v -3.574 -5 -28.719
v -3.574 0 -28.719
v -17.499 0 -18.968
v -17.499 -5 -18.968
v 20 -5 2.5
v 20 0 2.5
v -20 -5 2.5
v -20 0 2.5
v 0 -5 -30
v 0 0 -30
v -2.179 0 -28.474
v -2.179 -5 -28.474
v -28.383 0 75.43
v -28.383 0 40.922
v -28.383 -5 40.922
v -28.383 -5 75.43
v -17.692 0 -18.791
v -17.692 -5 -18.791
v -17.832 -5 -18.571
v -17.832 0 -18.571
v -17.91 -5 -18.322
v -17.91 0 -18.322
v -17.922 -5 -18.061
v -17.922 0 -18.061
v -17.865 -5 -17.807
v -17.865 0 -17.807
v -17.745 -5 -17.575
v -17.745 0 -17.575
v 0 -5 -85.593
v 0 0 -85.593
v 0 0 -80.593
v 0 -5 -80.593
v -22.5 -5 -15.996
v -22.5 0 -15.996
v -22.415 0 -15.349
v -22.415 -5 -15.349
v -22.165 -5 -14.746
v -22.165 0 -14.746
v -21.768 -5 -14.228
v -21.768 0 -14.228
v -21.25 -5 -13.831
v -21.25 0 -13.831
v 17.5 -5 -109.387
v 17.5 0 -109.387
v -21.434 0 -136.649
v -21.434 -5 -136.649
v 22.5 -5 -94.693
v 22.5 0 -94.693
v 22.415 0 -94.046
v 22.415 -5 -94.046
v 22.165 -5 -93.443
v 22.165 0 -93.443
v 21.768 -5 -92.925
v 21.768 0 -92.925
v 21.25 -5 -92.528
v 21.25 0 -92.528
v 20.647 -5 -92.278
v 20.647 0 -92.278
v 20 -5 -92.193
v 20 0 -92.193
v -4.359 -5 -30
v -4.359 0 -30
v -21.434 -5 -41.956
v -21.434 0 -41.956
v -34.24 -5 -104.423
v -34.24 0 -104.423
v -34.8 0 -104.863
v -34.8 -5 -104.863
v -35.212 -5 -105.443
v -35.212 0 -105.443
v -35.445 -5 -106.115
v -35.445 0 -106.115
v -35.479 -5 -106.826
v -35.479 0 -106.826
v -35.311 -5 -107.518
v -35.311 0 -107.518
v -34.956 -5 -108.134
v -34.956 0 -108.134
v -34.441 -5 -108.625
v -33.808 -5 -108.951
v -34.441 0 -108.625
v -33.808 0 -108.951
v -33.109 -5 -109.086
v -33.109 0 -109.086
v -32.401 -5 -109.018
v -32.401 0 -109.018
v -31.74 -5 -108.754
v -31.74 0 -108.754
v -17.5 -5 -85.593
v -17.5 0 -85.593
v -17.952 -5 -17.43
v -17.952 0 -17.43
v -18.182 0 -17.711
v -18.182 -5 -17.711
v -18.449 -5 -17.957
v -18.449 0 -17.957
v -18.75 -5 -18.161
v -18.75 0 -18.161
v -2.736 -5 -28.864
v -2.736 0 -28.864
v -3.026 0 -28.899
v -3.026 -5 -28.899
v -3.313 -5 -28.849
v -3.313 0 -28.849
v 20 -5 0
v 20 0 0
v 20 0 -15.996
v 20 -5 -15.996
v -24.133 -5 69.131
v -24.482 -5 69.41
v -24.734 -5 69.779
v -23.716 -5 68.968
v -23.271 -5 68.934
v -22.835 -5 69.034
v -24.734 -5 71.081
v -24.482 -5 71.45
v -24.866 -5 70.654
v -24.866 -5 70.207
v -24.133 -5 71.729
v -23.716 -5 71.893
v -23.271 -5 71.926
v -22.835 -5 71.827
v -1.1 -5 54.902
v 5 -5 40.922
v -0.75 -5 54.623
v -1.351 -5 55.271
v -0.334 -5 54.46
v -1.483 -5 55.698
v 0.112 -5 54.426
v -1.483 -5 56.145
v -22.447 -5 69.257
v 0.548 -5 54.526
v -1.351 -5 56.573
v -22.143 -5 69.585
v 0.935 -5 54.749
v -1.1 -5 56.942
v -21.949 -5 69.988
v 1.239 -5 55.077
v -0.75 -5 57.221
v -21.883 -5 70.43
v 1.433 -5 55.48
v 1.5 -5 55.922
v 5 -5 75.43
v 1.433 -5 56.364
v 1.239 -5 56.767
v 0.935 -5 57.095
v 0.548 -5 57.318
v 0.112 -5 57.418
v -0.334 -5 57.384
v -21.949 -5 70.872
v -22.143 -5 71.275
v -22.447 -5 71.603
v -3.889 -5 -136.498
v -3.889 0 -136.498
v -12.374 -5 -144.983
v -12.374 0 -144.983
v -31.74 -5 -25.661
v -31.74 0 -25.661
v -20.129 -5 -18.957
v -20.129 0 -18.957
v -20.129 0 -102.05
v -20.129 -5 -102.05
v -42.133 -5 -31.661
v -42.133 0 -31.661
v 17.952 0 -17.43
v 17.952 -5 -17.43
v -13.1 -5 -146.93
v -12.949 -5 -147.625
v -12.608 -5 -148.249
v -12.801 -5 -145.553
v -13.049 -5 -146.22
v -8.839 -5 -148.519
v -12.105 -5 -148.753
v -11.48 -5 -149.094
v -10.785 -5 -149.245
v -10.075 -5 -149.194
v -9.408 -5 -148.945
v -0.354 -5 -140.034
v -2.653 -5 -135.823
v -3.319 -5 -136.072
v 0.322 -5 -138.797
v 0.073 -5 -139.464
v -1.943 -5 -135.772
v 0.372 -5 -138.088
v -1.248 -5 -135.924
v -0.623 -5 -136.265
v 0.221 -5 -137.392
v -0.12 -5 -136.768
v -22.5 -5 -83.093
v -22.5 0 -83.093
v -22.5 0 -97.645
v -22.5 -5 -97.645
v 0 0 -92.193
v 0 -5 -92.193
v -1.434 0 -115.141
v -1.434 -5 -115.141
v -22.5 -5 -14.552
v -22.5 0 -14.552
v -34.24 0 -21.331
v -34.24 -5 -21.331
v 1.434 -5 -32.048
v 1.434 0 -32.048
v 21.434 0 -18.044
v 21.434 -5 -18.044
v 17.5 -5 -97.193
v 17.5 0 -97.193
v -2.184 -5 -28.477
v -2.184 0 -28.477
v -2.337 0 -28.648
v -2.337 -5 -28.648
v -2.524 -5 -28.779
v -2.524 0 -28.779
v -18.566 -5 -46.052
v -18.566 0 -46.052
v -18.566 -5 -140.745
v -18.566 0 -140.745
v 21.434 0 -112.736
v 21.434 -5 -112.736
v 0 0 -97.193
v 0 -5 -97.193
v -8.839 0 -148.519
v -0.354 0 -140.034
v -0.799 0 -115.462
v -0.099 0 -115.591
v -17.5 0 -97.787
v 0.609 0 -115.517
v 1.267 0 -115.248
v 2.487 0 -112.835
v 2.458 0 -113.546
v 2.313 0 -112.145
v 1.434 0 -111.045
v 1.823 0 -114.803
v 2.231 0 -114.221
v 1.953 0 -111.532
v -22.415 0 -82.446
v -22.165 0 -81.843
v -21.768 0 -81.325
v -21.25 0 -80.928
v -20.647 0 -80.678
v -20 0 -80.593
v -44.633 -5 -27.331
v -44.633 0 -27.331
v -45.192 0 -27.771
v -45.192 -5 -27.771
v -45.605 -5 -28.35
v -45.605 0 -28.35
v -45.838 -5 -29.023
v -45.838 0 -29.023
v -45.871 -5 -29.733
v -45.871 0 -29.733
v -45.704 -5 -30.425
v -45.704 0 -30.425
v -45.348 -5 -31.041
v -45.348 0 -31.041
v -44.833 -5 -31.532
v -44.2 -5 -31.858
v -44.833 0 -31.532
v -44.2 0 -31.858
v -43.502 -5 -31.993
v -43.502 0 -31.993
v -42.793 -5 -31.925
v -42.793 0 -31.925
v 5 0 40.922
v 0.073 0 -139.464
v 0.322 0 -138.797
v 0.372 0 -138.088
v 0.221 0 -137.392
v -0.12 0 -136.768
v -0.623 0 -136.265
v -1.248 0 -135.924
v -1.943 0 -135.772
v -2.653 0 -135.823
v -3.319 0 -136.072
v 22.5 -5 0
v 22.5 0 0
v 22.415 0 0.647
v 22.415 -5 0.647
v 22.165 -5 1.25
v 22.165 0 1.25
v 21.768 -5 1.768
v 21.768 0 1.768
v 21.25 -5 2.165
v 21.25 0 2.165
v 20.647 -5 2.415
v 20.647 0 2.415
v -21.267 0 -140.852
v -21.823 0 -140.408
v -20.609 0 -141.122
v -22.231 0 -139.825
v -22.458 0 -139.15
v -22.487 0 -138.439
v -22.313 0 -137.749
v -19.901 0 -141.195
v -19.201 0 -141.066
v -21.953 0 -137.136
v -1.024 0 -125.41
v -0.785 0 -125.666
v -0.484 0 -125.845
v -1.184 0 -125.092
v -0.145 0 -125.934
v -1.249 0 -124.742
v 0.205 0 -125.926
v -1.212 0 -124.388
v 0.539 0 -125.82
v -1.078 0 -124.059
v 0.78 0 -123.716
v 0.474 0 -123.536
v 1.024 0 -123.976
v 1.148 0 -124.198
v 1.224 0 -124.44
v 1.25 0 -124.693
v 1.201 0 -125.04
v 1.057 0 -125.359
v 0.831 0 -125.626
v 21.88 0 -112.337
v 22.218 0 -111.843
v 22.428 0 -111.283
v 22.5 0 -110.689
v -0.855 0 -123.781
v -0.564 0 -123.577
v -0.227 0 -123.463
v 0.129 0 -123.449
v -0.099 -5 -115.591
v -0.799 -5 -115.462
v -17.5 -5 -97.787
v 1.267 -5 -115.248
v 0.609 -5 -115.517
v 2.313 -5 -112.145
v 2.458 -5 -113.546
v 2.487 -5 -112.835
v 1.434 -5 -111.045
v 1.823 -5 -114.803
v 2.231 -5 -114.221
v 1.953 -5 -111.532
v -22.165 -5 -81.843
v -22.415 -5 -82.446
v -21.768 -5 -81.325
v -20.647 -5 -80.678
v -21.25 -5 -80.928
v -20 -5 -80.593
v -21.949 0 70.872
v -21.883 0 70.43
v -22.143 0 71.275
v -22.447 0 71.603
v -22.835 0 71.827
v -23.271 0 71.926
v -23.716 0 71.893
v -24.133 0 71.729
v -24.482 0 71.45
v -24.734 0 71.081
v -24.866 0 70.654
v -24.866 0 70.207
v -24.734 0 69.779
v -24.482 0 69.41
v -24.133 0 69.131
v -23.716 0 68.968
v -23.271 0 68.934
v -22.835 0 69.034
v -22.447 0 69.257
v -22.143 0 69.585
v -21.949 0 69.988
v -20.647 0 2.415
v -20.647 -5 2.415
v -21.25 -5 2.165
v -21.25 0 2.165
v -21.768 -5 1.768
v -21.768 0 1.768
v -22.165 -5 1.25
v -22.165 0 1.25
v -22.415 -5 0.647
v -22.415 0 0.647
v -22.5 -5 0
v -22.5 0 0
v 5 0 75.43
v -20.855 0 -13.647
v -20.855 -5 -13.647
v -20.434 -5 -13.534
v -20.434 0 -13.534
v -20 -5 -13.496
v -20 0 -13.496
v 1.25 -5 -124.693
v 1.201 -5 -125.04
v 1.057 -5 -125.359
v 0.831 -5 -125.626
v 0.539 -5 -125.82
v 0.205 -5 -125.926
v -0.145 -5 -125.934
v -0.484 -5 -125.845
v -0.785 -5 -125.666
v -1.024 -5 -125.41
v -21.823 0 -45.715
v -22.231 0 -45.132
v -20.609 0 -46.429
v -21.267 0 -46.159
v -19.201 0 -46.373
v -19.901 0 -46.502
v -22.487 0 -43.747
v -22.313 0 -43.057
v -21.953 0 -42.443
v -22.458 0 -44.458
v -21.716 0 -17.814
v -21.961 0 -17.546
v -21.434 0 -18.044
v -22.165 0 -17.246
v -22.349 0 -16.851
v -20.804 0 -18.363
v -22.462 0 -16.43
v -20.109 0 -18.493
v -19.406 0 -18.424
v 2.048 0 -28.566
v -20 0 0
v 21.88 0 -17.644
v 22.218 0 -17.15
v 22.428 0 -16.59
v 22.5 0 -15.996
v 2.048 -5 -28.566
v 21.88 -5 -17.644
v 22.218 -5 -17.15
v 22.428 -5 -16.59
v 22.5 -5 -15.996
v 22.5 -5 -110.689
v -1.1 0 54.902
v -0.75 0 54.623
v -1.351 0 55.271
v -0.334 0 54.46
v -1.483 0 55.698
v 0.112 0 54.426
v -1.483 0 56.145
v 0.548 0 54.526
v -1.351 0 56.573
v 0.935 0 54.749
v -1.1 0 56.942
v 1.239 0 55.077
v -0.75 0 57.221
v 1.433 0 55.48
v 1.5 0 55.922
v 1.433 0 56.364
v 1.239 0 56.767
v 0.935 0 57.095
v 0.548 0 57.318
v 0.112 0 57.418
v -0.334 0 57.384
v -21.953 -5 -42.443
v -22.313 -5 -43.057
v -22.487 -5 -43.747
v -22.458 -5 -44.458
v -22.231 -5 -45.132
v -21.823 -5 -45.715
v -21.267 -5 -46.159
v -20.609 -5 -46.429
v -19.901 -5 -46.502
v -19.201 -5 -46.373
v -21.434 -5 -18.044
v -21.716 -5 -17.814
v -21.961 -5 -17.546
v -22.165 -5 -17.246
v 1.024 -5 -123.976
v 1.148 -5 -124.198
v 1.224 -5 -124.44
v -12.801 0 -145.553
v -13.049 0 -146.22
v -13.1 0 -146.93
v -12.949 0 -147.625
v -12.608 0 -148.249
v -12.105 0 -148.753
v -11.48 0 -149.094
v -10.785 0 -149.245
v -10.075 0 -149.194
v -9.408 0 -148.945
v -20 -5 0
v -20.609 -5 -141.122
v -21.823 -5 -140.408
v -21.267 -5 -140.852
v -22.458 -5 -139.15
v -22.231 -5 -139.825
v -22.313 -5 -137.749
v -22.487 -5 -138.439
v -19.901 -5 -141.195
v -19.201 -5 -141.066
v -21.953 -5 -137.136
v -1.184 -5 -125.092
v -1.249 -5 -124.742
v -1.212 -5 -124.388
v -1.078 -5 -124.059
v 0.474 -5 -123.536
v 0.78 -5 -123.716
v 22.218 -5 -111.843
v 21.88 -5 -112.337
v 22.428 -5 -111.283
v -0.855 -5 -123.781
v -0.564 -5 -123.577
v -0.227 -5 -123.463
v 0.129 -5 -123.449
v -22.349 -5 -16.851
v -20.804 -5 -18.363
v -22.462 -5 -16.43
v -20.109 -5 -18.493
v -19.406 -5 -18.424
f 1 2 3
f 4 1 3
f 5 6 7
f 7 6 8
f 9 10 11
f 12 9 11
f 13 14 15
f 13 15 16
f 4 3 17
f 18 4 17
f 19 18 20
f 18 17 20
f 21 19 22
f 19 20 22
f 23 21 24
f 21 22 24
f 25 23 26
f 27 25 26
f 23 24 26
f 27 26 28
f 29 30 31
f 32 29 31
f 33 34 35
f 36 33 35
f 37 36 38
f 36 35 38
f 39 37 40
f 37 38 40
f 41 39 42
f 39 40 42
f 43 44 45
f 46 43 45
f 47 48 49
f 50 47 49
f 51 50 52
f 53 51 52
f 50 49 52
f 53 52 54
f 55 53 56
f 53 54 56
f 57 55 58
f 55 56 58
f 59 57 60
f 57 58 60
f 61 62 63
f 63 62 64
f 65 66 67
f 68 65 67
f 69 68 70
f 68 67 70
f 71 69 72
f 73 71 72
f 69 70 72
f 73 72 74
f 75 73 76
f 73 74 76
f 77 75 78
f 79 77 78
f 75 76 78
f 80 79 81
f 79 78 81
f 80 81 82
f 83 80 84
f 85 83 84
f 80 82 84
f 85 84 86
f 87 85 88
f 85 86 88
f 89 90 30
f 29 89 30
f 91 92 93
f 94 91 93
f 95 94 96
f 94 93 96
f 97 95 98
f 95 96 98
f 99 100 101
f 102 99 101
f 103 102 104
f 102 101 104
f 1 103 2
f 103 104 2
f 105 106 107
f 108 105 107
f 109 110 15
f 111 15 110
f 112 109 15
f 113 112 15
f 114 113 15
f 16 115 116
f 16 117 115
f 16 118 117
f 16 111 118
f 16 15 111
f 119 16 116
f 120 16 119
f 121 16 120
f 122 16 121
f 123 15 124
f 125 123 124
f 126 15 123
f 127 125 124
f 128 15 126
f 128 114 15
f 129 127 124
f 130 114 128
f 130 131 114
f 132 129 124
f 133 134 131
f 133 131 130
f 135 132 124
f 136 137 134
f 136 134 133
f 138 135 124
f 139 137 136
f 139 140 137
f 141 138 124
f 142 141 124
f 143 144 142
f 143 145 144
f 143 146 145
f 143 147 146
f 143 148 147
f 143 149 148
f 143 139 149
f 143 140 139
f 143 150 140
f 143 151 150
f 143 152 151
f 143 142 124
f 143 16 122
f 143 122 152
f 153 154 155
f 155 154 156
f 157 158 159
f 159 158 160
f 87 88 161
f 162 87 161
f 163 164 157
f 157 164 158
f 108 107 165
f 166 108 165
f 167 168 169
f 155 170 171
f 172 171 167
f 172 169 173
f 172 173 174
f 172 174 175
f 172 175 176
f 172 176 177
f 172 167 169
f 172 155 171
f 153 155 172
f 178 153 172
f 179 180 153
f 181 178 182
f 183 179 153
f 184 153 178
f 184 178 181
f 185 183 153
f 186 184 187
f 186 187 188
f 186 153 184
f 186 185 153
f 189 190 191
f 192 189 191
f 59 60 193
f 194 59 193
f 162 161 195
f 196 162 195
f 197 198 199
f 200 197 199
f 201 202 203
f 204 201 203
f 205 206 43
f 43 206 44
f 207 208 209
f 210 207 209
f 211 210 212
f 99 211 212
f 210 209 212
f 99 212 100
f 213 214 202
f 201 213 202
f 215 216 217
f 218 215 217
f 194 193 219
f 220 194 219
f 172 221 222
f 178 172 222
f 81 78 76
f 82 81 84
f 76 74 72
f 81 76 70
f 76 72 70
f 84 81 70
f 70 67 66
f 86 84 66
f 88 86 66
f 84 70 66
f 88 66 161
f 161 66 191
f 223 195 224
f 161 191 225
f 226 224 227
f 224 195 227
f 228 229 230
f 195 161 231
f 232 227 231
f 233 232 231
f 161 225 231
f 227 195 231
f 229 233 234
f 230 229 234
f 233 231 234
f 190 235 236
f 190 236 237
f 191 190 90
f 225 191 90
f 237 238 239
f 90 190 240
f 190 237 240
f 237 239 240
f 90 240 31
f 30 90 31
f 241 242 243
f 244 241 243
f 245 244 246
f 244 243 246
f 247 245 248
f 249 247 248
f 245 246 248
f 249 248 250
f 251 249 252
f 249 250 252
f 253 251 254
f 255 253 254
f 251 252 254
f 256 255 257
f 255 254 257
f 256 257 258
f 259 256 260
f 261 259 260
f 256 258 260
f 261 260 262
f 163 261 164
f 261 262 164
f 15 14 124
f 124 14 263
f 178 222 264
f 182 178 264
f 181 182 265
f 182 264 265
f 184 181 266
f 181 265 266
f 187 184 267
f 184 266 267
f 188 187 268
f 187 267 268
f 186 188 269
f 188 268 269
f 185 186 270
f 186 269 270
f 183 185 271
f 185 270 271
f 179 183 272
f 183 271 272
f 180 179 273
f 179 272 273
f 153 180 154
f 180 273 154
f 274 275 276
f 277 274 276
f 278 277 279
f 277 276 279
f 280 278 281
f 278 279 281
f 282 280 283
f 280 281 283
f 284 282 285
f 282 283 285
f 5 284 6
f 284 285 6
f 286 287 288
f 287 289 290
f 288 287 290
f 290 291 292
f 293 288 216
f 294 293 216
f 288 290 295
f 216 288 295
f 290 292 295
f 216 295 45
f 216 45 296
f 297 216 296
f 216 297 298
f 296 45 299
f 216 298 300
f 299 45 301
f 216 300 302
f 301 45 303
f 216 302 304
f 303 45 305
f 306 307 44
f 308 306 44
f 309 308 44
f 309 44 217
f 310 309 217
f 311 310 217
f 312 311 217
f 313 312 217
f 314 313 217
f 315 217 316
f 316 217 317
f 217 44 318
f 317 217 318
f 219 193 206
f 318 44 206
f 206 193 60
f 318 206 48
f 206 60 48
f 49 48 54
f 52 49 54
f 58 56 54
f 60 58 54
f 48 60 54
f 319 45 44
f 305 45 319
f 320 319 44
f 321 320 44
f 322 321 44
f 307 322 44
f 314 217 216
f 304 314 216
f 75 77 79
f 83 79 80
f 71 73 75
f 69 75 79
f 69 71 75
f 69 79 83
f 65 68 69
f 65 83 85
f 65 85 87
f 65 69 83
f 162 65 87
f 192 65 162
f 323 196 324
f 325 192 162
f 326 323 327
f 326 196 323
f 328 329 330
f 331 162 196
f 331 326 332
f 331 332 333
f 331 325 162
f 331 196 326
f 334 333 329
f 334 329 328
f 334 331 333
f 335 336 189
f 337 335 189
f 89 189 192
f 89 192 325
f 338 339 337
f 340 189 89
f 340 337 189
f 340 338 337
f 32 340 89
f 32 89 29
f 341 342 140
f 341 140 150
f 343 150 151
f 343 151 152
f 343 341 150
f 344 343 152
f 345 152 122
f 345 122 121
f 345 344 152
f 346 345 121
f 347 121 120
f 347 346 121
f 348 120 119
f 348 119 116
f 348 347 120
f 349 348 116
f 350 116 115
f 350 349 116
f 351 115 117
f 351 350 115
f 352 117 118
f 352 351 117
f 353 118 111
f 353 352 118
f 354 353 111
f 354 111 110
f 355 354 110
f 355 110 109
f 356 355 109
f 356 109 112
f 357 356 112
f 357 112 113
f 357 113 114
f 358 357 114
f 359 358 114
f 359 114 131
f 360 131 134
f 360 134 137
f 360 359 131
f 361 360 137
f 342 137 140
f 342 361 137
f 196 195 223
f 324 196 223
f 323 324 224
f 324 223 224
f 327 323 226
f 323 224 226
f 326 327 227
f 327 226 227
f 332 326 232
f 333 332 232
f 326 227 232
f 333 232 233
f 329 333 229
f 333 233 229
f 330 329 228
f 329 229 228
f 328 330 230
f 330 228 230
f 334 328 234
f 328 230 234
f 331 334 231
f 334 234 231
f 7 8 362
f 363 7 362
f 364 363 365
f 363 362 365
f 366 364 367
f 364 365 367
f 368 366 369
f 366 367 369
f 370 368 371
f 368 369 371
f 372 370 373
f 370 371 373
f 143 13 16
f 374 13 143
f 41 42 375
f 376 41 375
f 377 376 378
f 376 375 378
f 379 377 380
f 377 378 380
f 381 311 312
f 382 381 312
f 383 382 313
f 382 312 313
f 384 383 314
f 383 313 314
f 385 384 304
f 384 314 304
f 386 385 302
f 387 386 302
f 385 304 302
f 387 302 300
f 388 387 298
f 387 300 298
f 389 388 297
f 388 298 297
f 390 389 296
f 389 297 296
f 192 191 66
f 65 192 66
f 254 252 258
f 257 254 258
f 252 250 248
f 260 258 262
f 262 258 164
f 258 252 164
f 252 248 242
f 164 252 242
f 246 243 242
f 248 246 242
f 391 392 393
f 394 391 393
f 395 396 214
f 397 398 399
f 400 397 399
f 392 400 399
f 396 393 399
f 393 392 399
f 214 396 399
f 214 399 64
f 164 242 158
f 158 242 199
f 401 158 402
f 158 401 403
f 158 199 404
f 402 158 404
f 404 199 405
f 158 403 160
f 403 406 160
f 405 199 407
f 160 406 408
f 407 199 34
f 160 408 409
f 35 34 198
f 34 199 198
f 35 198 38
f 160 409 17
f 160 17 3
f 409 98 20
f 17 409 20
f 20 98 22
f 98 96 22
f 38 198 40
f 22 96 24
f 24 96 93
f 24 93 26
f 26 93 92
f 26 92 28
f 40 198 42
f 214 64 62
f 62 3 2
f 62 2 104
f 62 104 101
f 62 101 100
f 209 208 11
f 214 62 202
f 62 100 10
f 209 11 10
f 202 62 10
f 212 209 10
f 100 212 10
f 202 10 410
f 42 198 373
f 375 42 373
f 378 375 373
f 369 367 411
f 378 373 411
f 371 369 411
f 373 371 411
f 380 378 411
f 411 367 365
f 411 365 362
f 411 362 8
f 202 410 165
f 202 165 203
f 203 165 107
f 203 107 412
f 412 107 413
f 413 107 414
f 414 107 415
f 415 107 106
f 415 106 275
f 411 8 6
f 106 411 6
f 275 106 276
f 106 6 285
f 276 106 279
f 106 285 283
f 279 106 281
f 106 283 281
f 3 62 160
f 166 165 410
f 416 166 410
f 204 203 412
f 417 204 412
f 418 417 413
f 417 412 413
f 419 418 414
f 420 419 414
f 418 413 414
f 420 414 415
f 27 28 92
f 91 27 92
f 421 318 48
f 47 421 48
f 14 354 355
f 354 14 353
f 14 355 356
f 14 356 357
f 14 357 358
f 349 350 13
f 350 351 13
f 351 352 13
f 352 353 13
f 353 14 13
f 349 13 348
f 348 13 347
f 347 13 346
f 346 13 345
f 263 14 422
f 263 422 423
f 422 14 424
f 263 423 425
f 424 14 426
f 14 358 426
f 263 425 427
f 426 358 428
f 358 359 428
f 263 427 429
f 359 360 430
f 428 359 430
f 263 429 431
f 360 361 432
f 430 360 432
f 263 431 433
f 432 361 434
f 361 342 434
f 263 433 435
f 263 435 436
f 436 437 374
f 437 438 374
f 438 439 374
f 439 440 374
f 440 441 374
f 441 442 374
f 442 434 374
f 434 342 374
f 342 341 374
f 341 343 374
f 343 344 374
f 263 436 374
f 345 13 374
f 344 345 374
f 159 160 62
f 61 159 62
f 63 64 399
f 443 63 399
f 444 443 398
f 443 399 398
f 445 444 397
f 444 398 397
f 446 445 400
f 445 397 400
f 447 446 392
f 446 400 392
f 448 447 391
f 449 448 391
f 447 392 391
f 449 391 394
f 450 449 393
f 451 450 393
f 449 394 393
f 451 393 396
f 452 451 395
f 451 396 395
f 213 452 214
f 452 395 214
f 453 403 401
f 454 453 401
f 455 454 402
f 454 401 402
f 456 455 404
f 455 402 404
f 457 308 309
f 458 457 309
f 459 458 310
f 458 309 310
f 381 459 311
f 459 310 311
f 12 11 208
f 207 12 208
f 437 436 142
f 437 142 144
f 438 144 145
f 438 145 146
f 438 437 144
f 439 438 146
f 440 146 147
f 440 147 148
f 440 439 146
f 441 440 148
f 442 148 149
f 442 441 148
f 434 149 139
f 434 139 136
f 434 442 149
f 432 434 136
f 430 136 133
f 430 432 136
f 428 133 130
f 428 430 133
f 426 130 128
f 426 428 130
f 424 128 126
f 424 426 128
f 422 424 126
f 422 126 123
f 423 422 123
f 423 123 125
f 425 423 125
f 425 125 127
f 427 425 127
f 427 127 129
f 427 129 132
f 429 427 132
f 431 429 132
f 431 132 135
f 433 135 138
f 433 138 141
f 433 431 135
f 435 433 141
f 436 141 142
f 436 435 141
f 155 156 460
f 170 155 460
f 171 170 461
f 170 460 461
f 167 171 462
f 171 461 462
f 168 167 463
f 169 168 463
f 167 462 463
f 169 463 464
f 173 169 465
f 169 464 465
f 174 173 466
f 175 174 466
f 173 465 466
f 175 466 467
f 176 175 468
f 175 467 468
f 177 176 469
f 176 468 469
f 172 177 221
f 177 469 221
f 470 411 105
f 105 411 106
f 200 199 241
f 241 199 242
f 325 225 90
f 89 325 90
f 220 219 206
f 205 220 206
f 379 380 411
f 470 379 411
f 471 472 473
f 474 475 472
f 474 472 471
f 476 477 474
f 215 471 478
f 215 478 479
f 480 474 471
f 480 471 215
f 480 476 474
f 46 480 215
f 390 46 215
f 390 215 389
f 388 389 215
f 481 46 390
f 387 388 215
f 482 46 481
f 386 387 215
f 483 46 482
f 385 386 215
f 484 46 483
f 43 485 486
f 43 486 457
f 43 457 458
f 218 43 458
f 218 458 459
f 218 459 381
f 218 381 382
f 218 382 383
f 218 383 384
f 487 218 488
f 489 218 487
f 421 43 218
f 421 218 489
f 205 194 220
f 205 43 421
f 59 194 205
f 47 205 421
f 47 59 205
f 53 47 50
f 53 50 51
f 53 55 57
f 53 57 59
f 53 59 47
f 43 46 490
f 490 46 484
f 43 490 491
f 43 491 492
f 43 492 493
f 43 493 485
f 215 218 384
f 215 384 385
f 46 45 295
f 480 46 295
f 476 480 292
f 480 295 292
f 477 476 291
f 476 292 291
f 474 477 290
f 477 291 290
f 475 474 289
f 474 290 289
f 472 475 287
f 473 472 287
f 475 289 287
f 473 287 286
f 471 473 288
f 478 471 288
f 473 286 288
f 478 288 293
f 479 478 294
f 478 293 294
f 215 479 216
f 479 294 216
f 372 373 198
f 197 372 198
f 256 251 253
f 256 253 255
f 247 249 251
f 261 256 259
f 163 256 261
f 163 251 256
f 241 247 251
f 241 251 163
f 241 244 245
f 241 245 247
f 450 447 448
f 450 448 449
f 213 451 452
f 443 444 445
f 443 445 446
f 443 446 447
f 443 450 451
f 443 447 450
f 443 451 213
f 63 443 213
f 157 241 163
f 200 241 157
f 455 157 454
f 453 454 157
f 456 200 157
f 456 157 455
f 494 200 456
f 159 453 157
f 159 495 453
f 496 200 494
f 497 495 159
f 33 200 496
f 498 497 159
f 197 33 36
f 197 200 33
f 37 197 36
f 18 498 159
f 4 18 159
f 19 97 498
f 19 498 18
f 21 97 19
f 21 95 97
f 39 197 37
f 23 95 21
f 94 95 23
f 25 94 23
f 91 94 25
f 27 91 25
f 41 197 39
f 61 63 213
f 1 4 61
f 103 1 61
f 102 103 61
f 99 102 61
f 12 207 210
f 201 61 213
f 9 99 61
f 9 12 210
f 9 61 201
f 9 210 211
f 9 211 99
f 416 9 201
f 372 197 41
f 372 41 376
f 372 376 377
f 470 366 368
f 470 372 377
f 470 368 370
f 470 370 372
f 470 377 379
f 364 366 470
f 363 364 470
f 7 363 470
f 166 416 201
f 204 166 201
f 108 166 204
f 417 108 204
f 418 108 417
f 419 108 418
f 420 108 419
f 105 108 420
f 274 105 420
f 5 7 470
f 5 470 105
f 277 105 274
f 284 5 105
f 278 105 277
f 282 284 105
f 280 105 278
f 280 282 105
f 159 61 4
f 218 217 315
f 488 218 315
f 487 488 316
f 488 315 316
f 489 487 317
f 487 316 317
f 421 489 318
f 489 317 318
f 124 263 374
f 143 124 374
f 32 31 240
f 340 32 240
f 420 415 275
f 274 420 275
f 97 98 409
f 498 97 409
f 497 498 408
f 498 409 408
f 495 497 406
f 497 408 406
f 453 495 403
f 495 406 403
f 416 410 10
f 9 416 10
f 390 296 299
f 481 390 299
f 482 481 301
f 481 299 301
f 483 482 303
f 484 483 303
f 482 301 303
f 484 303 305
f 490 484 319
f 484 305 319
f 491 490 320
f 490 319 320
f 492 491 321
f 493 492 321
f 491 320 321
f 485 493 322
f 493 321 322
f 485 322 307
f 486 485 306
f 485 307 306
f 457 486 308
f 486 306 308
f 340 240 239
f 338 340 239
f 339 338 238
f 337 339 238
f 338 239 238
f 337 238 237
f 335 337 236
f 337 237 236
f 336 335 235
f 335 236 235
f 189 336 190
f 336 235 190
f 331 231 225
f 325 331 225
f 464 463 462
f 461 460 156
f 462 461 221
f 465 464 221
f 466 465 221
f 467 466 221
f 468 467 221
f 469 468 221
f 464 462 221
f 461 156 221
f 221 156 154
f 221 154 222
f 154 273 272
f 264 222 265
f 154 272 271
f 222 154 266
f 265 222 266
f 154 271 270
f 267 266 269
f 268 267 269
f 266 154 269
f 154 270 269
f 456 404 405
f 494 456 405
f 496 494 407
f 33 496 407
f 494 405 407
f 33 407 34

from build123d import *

# Parameters (mm, degrees)
F1_DEPTH = 5
F0_W     = 2.5
F0_H     = 2.5
F0_W_2   = 17.5
F0_W_3   = 33.3826859022
F0_H_2   = 34.5083015284
F0_R     = 1.5


with BuildPart() as f1:
    # F0 (on Front) → F1 (new body)
    with BuildSketch(Plane.XZ):
        with BuildLine():
            Line((0, 2.5), (0, 0))
            Line((0, 0), (17.5, 0))
            ThreePointArc((17.5, 0), (18.232233047, 1.767766953), (20, 2.5))
            Line((20, 2.5), (0, 2.5))
        make_face()
        with BuildLine():
            Line((-17.5, 0), (0, 0))
            Line((0, 0), (0, 2.5))
            Line((0, 2.5), (-20, 2.5))
            ThreePointArc((-20, 2.5), (-18.232233047, 1.767766953), (-17.5, 0))
        make_face()
        with BuildLine():
            ThreePointArc((20, 2.5), (18.232233047, 1.767766953), (17.5, 0))
            Line((17.5, 0), (20, 0))
            Line((20, 0), (20, -2.5))
            ThreePointArc((20, -2.5), (21.767766953, -1.767766953), (22.5, 0))
            ThreePointArc((22.5, 0), (21.767766953, 1.767766953), (20, 2.5))
        make_face()
        with BuildLine():
            Line((-20, 0), (-17.5, 0))
            ThreePointArc((-17.5, 0), (-18.232233047, 1.767766953), (-20, 2.5))
            ThreePointArc((-20, 2.5), (-21.767766953, 1.767766953), (-22.5, 0))
            ThreePointArc((-22.5, 0), (-21.767766953, -1.767766953), (-20, -2.5))
            Line((-20, -2.5), (-20, 0))
        make_face()
        with BuildLine():
            ThreePointArc((22.5, 0), (21.767766953, -1.767766953), (20, -2.5))
            Line((20, -2.5), (20, -13.4958492358))
            ThreePointArc((20, -13.4958492358), (21.767766953, -14.2280822828), (22.5, -15.9958492358))
            Line((22.5, -15.9958492358), (22.5, 0))
        make_face()
        with BuildLine():
            Line((-20, -13.4958492358), (-20, -2.5))
            ThreePointArc((-20, -2.5), (-21.767766953, -1.767766953), (-22.5, 0))
            Line((-22.5, 0), (-22.5, -14.5524735628))
            Line((-22.5, -14.5524735628), (-21.25, -13.8307857263))
            ThreePointArc((-21.25, -13.8307857263), (-20.6470476128, -13.5810346701), (-20, -13.4958492358))
        make_face()
        with BuildLine():
            ThreePointArc((22.5, -15.9958492358), (21.767766953, -14.2280822828), (20, -13.4958492358))
            Line((20, -13.4958492358), (20, -15.9958492358))
            Line((20, -15.9958492358), (17.9521198893, -17.4297903267))
            ThreePointArc((17.9521198893, -17.4297903267), (19.5658795558, -18.4578686183), (21.4339410909, -18.0437293465))
            ThreePointArc((21.4339410909, -18.0437293465), (22.2175270829, -17.1502207689), (22.5, -15.9958492358))
        make_face()
        with BuildLine():
            Line((-21.25, -13.8307857263), (-22.5, -14.5524735628))
            Line((-22.5, -14.5524735628), (-22.5, -15.9958492358))
            ThreePointArc((-22.5, -15.9958492358), (-22.1650635095, -14.7458492358), (-21.25, -13.8307857263))
        make_face()
        with BuildLine():
            Line((-22.5, -15.9958492358), (-22.5, -14.5524735628))
            Line((-22.5, -14.5524735628), (-34.2403810568, -21.3307857263))
            ThreePointArc((-34.2403810568, -21.3307857263), (-32.343333444, -21.0810346701), (-30.8253175473, -22.2458492358))
            Line((-30.8253175473, -22.2458492358), (-22.1650635095, -17.2458492358))
            ThreePointArc((-22.1650635095, -17.2458492358), (-22.4148145657, -16.6428968486), (-22.5, -15.9958492358))
        make_face()
        with BuildLine():
            Line((1.4339411547, -32.0478800661), (21.4339410909, -18.0437293465))
            ThreePointArc((21.4339410909, -18.0437293465), (19.5658795558, -18.4578686183), (17.9521198893, -17.4297903267))
            Line((17.9521198893, -17.4297903267), (2.0478801107, -28.5660589091))
            ThreePointArc((2.0478801107, -28.5660589091), (2.4620193893, -30.4341204058), (1.4339411547, -32.0478800661))
        make_face()
        with BuildLine():
            Line((0, -30), (-2.1793084945, -28.474031764))
            Line((-2.1793084945, -28.474031764), (-2.1838419664, -28.4772061352))
            ThreePointArc((-2.1838419664, -28.4772061352), (-2.4264235636, -28.7185294297), (-2.7361610753, -28.8639441388))
            Line((-2.7361610753, -28.8639441388), (-4.3586169891, -30))
            Line((-4.3586169891, -30), (-2.1793084945, -31.525968236))
            Line((-2.1793084945, -31.525968236), (0, -30))
        make_face()
        with BuildLine():
            ThreePointArc((-30.8253175473, -22.2458492358), (-32.343333444, -21.0810346701), (-34.2403810568, -21.3307857263))
            ThreePointArc((-34.2403810568, -21.3307857263), (-35.4051956225, -22.848801623), (-35.1554445662, -24.7458492358))
            Line((-35.1554445662, -24.7458492358), (-32.9903810568, -23.4958492358))
            Line((-32.9903810568, -23.4958492358), (-30.8253175473, -22.2458492358))
        make_face()
        with BuildLine():
            ThreePointArc((-35.1554445662, -24.7458492358), (-35.4051956225, -22.848801623), (-34.2403810568, -21.3307857263))
            Line((-34.2403810568, -21.3307857263), (-44.6326859022, -27.3307857263))
            ThreePointArc((-44.6326859022, -27.3307857263), (-45.5477494116, -30.7458492358), (-42.1326859022, -31.6609127453))
            Line((-42.1326859022, -31.6609127453), (-31.7403810568, -25.6609127453))
            ThreePointArc((-31.7403810568, -25.6609127453), (-33.6374286695, -25.9106638015), (-35.1554445662, -24.7458492358))
        make_face()
        with BuildLine():
            Line((-17.7447367972, -17.5750015311), (-17.9521198893, -17.4297903267))
            ThreePointArc((-17.9521198893, -17.4297903267), (-18.311024481, -17.8390425778), (-18.75, -18.1609127453))
            Line((-18.75, -18.1609127453), (-20.1292975746, -18.9572505713))
            Line((-20.1292975746, -18.9572505713), (-4.3586169891, -30))
            Line((-4.3586169891, -30), (-2.7361610753, -28.8639441388))
            ThreePointArc((-2.7361610753, -28.8639441388), (-3.1710867936, -28.8846333466), (-3.5735764364, -28.7185294297))
            Line((-3.5735764364, -28.7185294297), (-17.4991611893, -18.9677300117))
            ThreePointArc((-17.4991611893, -18.9677300117), (-17.9103925059, -18.3222261451), (-17.7447367972, -17.5750015311))
        make_face()
        with BuildLine():
            ThreePointArc((-1.4339410909, -32.0478801107), (3.89e-08, -32.5), (1.4339411547, -32.0478800661))
            ThreePointArc((1.4339411547, -32.0478800661), (2.4620193893, -30.4341204058), (2.0478801107, -28.5660589091))
            Line((2.0478801107, -28.5660589091), (0, -30))
            Line((0, -30), (-2.1793084945, -31.525968236))
            Line((-2.1793084945, -31.525968236), (-1.4339410909, -32.0478801107))
        make_face()
        with BuildLine():
            Line((-18.5660589091, -46.0520308749), (1.4339411547, -32.0478800661))
            ThreePointArc((1.4339411547, -32.0478800661), (3.89e-08, -32.5), (-1.4339410909, -32.0478801107))
            Line((-1.4339410909, -32.0478801107), (-2.1793084945, -31.525968236))
            Line((-2.1793084945, -31.525968236), (-4.3586169891, -30))
            Line((-4.3586169891, -30), (-21.4339410909, -41.9562706535))
            ThreePointArc((-21.4339410909, -41.9562706535), (-22.0478801107, -45.4380918551), (-18.5660589091, -46.0520308749))
        make_face()
        with BuildLine():
            ThreePointArc((-21.4339410909, -18.0437293465), (-21.843193342, -17.6848247548), (-22.1650635095, -17.2458492358))
            Line((-22.1650635095, -17.2458492358), (-30.8253175473, -22.2458492358))
            ThreePointArc((-30.8253175473, -22.2458492358), (-30.575566491, -24.1428968486), (-31.7403810568, -25.6609127453))
            Line((-31.7403810568, -25.6609127453), (-20.1292975746, -18.9572505713))
            Line((-20.1292975746, -18.9572505713), (-21.4339410909, -18.0437293465))
        make_face()
        with BuildLine():
            Line((-32.9903810568, -23.4958492358), (-35.1554445662, -24.7458492358))
            ThreePointArc((-35.1554445662, -24.7458492358), (-33.6374286695, -25.9106638015), (-31.7403810568, -25.6609127453))
            ThreePointArc((-31.7403810568, -25.6609127453), (-30.575566491, -24.1428968486), (-30.8253175473, -22.2458492358))
            Line((-30.8253175473, -22.2458492358), (-32.9903810568, -23.4958492358))
        make_face()
        with BuildLine():
            Line((-20.1292975746, -18.9572505713), (-18.75, -18.1609127453))
            ThreePointArc((-18.75, -18.1609127453), (-20.1090484684, -18.4934697898), (-21.4339410909, -18.0437293465))
            Line((-21.4339410909, -18.0437293465), (-20.1292975746, -18.9572505713))
        make_face()
    extrude(amount=F1_DEPTH)


with BuildPart() as f1b:
    # F0 (on Front) → F1, piece 2 (new body)
    with BuildSketch(Plane.XZ):
        with BuildLine():
            ThreePointArc((-17.5, -99.0884940465), (-17.6157076231, -99.8402585452), (-17.9521198893, -100.5224351374))
            ThreePointArc((-17.9521198893, -100.5224351374), (-18.311024481, -100.9316873885), (-18.75, -101.2535575559))
            Line((-18.75, -101.2535575559), (-20.1292975746, -102.049895382))
            Line((-20.1292975746, -102.049895382), (-1.4339410909, -115.1405249214))
            ThreePointArc((-1.4339410909, -115.1405249214), (2.0478801107, -114.5265859016), (1.4339410909, -111.0447647))
            Line((1.4339410909, -111.0447647), (-17.5, -97.7870764201))
            Line((-17.5, -97.7870764201), (-17.5, -99.0884940465))
        make_face()
        with BuildLine():
            ThreePointArc((-18.5660589091, -97.0406139358), (-17.7824729171, -97.9341225134), (-17.5, -99.0884940465))
            Line((-17.5, -99.0884940465), (-17.5, -97.7870764201))
            Line((-17.5, -97.7870764201), (-18.5660589091, -97.0406139358))
        make_face()
        with BuildLine():
            Line((-20.1292975746, -102.049895382), (-18.75, -101.2535575559))
            ThreePointArc((-18.75, -101.2535575559), (-20.1090484684, -101.5861146004), (-21.4339410909, -101.1363741572))
            Line((-21.4339410909, -101.1363741572), (-20.1292975746, -102.049895382))
        make_face()
        with BuildLine():
            ThreePointArc((-21.25, -96.923430537), (-20.6470476128, -96.6736794808), (-20, -96.5884940465))
            Line((-20, -96.5884940465), (-20, -85.5926448107))
            ThreePointArc((-20, -85.5926448107), (-21.767766953, -84.8604117636), (-22.5, -83.0926448107))
            Line((-22.5, -83.0926448107), (-22.5, -97.6451183735))
            Line((-22.5, -97.6451183735), (-21.25, -96.923430537))
        make_face()
        with BuildLine():
            Line((-20, -85.5926448107), (-20, -96.5884940465))
            ThreePointArc((-20, -96.5884940465), (-19.2482355012, -96.7042016696), (-18.5660589091, -97.0406139358))
            Line((-18.5660589091, -97.0406139358), (-17.5, -97.7870764201))
            Line((-17.5, -97.7870764201), (-17.5, -85.5926448107))
            Line((-17.5, -85.5926448107), (-20, -85.5926448107))
        make_face()
        with BuildLine():
            ThreePointArc((-21.4339410909, -101.1363741572), (-21.843193342, -100.7774695655), (-22.1650635095, -100.3384940465))
            ThreePointArc((-22.1650635095, -100.3384940465), (-22.4148145657, -99.7355416592), (-22.5, -99.0884940465))
            Line((-22.5, -99.0884940465), (-22.5, -97.6451183735))
            Line((-22.5, -97.6451183735), (-34.2403810568, -104.423430537))
            ThreePointArc((-34.2403810568, -104.423430537), (-35.1554445662, -107.8384940465), (-31.7403810568, -108.7535575559))
            Line((-31.7403810568, -108.7535575559), (-20.1292975746, -102.049895382))
            Line((-20.1292975746, -102.049895382), (-21.4339410909, -101.1363741572))
        make_face()
        with BuildLine():
            ThreePointArc((-22.5, -83.0926448107), (-21.767766953, -84.8604117636), (-20, -85.5926448107))
            Line((-20, -85.5926448107), (-20, -83.0926448107))
            Line((-20, -83.0926448107), (-17.5, -83.0926448107))
            ThreePointArc((-17.5, -83.0926448107), (-18.232233047, -81.3248778577), (-20, -80.5926448107))
            ThreePointArc((-20, -80.5926448107), (-21.767766953, -81.3248778577), (-22.5, -83.0926448107))
        make_face()
        with Locations((-18.75, -84.3426448107)):
            Rectangle(F0_W, F0_H)
        with BuildLine():
            ThreePointArc((-22.5, -99.0884940465), (-22.1650635095, -97.8384940465), (-21.25, -96.923430537))
            Line((-21.25, -96.923430537), (-22.5, -97.6451183735))
            Line((-22.5, -97.6451183735), (-22.5, -99.0884940465))
        make_face()
        with Locations((-8.75, -84.3426448107)):
            Rectangle(F0_W_2, F0_H)
        with BuildLine():
            ThreePointArc((-20, -80.5926448107), (-18.232233047, -81.3248778577), (-17.5, -83.0926448107))
            Line((-17.5, -83.0926448107), (0, -83.0926448107))
            Line((0, -83.0926448107), (0, -80.5926448107))
            Line((0, -80.5926448107), (-20, -80.5926448107))
        make_face()
        with BuildLine():
            ThreePointArc((-18.75, -101.2535575559), (-18.311024481, -100.9316873885), (-17.9521198893, -100.5224351374))
            Line((-17.9521198893, -100.5224351374), (-20, -99.0884940465))
            Line((-20, -99.0884940465), (-22.1650635095, -100.3384940465))
            ThreePointArc((-22.1650635095, -100.3384940465), (-21.843193342, -100.7774695655), (-21.4339410909, -101.1363741572))
            ThreePointArc((-21.4339410909, -101.1363741572), (-20.1090484684, -101.5861146004), (-18.75, -101.2535575559))
        make_face()
        with BuildLine():
            Line((-22.1650635095, -100.3384940465), (-20, -99.0884940465))
            Line((-20, -99.0884940465), (-20, -96.5884940465))
            ThreePointArc((-20, -96.5884940465), (-20.6470476128, -96.6736794808), (-21.25, -96.923430537))
            ThreePointArc((-21.25, -96.923430537), (-22.1650635095, -97.8384940465), (-22.5, -99.0884940465))
            ThreePointArc((-22.5, -99.0884940465), (-22.4148145657, -99.7355416592), (-22.1650635095, -100.3384940465))
        make_face()
        with BuildLine():
            Line((-20, -99.0884940465), (-17.9521198893, -100.5224351374))
            ThreePointArc((-17.9521198893, -100.5224351374), (-17.6157076231, -99.8402585452), (-17.5, -99.0884940465))
            ThreePointArc((-17.5, -99.0884940465), (-17.7824729171, -97.9341225134), (-18.5660589091, -97.0406139358))
            ThreePointArc((-18.5660589091, -97.0406139358), (-19.2482355012, -96.7042016696), (-20, -96.5884940465))
            Line((-20, -96.5884940465), (-20, -99.0884940465))
        make_face()
    extrude(amount=F1_DEPTH)


with BuildPart() as f1c:
    # F0 (on Front) → F1, piece 3 (new body)
    with BuildSketch(Plane.XZ):
        with BuildLine():
            Line((0, -92.1926623583), (0, -94.6926623583))
            Line((0, -94.6926623583), (17.5, -94.6926623583))
            ThreePointArc((17.5, -94.6926623583), (18.232233047, -92.9248954053), (20, -92.1926623583))
            Line((20, -92.1926623583), (0, -92.1926623583))
        make_face()
        with Locations((8.75, -95.9426623583)):
            Rectangle(F0_W_2, F0_H)
        with BuildLine():
            ThreePointArc((20, -92.1926623583), (18.232233047, -92.9248954053), (17.5, -94.6926623583))
            Line((17.5, -94.6926623583), (20, -94.6926623583))
            Line((20, -94.6926623583), (20, -97.1926623583))
            ThreePointArc((20, -97.1926623583), (21.767766953, -96.4604293113), (22.5, -94.6926623583))
            ThreePointArc((22.5, -94.6926623583), (21.767766953, -92.9248954053), (20, -92.1926623583))
        make_face()
        with Locations((18.75, -95.9426623583)):
            Rectangle(F0_W, F0_H)
        with BuildLine():
            Line((20, -97.1926623583), (17.5, -97.1926623583))
            Line((17.5, -97.1926623583), (17.5, -109.3870939677))
            Line((17.5, -109.3870939677), (18.5660589091, -108.6406314834))
            ThreePointArc((18.5660589091, -108.6406314834), (19.2482355012, -108.3042192172), (20, -108.1885115941))
            Line((20, -108.1885115941), (20, -97.1926623583))
        make_face()
        with BuildLine():
            ThreePointArc((22.5, -94.6926623583), (21.767766953, -96.4604293113), (20, -97.1926623583))
            Line((20, -97.1926623583), (20, -108.1885115941))
            ThreePointArc((20, -108.1885115941), (21.767766953, -108.9207446411), (22.5, -110.6885115941))
            Line((22.5, -110.6885115941), (22.5, -94.6926623583))
        make_face()
        with BuildLine():
            Line((17.5, -110.6885115941), (17.5, -109.3870939677))
            Line((17.5, -109.3870939677), (-21.4339410909, -136.6489330118))
            ThreePointArc((-21.4339410909, -136.6489330118), (-22.0478801107, -140.1307542134), (-18.5660589091, -140.7446932332))
            Line((-18.5660589091, -140.7446932332), (21.4339410909, -112.7363917048))
            ThreePointArc((21.4339410909, -112.7363917048), (19.5658795558, -113.1505309766), (17.9521198893, -112.122452685))
            ThreePointArc((17.9521198893, -112.122452685), (17.6157076231, -111.4402760929), (17.5, -110.6885115941))
        make_face()
        with BuildLine():
            ThreePointArc((-1.0239400554, -125.4096329037), (-0.7169705454, -123.6687223029), (1.0239400554, -123.9756918128))
            ThreePointArc((1.0239400554, -123.9756918128), (1.1921461884, -124.3167801089), (1.25, -124.6926623583))
            ThreePointArc((1.25, -124.6926623583), (0.3758822494, -125.8848085467), (-1.0239400554, -125.4096329037))
        make_face(mode=Mode.SUBTRACT)
        with BuildLine():
            Line((18.5660589091, -108.6406314834), (17.5, -109.3870939677))
            Line((17.5, -109.3870939677), (17.5, -110.6885115941))
            ThreePointArc((17.5, -110.6885115941), (17.6157076231, -111.4402760929), (17.9521198893, -112.122452685))
            Line((17.9521198893, -112.122452685), (20, -110.6885115941))
            Line((20, -110.6885115941), (20, -108.1885115941))
            ThreePointArc((20, -108.1885115941), (19.2482355012, -108.3042192172), (18.5660589091, -108.6406314834))
        make_face()
        with BuildLine():
            ThreePointArc((22.5, -110.6885115941), (21.767766953, -108.9207446411), (20, -108.1885115941))
            Line((20, -108.1885115941), (20, -110.6885115941))
            Line((20, -110.6885115941), (17.9521198893, -112.122452685))
            ThreePointArc((17.9521198893, -112.122452685), (19.5658795558, -113.1505309766), (21.4339410909, -112.7363917048))
            ThreePointArc((21.4339410909, -112.7363917048), (22.2175270829, -111.8428831272), (22.5, -110.6885115941))
        make_face()
    extrude(amount=F1_DEPTH)


with BuildPart() as f1d:
    # F0 (on Front) → F1, piece 4 (new body)
    with BuildSketch(Plane.XZ):
        with BuildLine():
            ThreePointArc((-0.3535533906, -140.0337104569), (-0.3535533906, -136.498176551), (-3.8890872965, -136.498176551))
            Line((-3.8890872965, -136.498176551), (-12.3743686708, -144.9834579252))
            ThreePointArc((-12.3743686708, -144.9834579252), (-12.3743686708, -148.5189918311), (-8.8388347648, -148.5189918311))
            Line((-8.8388347648, -148.5189918311), (-0.3535533906, -140.0337104569))
        make_face()
    extrude(amount=F1_DEPTH)


with BuildPart() as f1e:
    # F0 (on Front) → F1, piece 5 (new body)
    with BuildSketch(Plane.XZ):
        with Locations((-11.6913429511, 58.1760629575)):
            Rectangle(F0_W_3, F0_H_2)
        with Locations((-23.3826859022, 70.4302137217)):
            Circle(F0_R, mode=Mode.SUBTRACT)
        with Locations((0, 55.9219121933)):
            Circle(F0_R, mode=Mode.SUBTRACT)
    extrude(amount=F1_DEPTH)


solid = Compound([f1.part, f1b.part, f1c.part, f1d.part, f1e.part])
